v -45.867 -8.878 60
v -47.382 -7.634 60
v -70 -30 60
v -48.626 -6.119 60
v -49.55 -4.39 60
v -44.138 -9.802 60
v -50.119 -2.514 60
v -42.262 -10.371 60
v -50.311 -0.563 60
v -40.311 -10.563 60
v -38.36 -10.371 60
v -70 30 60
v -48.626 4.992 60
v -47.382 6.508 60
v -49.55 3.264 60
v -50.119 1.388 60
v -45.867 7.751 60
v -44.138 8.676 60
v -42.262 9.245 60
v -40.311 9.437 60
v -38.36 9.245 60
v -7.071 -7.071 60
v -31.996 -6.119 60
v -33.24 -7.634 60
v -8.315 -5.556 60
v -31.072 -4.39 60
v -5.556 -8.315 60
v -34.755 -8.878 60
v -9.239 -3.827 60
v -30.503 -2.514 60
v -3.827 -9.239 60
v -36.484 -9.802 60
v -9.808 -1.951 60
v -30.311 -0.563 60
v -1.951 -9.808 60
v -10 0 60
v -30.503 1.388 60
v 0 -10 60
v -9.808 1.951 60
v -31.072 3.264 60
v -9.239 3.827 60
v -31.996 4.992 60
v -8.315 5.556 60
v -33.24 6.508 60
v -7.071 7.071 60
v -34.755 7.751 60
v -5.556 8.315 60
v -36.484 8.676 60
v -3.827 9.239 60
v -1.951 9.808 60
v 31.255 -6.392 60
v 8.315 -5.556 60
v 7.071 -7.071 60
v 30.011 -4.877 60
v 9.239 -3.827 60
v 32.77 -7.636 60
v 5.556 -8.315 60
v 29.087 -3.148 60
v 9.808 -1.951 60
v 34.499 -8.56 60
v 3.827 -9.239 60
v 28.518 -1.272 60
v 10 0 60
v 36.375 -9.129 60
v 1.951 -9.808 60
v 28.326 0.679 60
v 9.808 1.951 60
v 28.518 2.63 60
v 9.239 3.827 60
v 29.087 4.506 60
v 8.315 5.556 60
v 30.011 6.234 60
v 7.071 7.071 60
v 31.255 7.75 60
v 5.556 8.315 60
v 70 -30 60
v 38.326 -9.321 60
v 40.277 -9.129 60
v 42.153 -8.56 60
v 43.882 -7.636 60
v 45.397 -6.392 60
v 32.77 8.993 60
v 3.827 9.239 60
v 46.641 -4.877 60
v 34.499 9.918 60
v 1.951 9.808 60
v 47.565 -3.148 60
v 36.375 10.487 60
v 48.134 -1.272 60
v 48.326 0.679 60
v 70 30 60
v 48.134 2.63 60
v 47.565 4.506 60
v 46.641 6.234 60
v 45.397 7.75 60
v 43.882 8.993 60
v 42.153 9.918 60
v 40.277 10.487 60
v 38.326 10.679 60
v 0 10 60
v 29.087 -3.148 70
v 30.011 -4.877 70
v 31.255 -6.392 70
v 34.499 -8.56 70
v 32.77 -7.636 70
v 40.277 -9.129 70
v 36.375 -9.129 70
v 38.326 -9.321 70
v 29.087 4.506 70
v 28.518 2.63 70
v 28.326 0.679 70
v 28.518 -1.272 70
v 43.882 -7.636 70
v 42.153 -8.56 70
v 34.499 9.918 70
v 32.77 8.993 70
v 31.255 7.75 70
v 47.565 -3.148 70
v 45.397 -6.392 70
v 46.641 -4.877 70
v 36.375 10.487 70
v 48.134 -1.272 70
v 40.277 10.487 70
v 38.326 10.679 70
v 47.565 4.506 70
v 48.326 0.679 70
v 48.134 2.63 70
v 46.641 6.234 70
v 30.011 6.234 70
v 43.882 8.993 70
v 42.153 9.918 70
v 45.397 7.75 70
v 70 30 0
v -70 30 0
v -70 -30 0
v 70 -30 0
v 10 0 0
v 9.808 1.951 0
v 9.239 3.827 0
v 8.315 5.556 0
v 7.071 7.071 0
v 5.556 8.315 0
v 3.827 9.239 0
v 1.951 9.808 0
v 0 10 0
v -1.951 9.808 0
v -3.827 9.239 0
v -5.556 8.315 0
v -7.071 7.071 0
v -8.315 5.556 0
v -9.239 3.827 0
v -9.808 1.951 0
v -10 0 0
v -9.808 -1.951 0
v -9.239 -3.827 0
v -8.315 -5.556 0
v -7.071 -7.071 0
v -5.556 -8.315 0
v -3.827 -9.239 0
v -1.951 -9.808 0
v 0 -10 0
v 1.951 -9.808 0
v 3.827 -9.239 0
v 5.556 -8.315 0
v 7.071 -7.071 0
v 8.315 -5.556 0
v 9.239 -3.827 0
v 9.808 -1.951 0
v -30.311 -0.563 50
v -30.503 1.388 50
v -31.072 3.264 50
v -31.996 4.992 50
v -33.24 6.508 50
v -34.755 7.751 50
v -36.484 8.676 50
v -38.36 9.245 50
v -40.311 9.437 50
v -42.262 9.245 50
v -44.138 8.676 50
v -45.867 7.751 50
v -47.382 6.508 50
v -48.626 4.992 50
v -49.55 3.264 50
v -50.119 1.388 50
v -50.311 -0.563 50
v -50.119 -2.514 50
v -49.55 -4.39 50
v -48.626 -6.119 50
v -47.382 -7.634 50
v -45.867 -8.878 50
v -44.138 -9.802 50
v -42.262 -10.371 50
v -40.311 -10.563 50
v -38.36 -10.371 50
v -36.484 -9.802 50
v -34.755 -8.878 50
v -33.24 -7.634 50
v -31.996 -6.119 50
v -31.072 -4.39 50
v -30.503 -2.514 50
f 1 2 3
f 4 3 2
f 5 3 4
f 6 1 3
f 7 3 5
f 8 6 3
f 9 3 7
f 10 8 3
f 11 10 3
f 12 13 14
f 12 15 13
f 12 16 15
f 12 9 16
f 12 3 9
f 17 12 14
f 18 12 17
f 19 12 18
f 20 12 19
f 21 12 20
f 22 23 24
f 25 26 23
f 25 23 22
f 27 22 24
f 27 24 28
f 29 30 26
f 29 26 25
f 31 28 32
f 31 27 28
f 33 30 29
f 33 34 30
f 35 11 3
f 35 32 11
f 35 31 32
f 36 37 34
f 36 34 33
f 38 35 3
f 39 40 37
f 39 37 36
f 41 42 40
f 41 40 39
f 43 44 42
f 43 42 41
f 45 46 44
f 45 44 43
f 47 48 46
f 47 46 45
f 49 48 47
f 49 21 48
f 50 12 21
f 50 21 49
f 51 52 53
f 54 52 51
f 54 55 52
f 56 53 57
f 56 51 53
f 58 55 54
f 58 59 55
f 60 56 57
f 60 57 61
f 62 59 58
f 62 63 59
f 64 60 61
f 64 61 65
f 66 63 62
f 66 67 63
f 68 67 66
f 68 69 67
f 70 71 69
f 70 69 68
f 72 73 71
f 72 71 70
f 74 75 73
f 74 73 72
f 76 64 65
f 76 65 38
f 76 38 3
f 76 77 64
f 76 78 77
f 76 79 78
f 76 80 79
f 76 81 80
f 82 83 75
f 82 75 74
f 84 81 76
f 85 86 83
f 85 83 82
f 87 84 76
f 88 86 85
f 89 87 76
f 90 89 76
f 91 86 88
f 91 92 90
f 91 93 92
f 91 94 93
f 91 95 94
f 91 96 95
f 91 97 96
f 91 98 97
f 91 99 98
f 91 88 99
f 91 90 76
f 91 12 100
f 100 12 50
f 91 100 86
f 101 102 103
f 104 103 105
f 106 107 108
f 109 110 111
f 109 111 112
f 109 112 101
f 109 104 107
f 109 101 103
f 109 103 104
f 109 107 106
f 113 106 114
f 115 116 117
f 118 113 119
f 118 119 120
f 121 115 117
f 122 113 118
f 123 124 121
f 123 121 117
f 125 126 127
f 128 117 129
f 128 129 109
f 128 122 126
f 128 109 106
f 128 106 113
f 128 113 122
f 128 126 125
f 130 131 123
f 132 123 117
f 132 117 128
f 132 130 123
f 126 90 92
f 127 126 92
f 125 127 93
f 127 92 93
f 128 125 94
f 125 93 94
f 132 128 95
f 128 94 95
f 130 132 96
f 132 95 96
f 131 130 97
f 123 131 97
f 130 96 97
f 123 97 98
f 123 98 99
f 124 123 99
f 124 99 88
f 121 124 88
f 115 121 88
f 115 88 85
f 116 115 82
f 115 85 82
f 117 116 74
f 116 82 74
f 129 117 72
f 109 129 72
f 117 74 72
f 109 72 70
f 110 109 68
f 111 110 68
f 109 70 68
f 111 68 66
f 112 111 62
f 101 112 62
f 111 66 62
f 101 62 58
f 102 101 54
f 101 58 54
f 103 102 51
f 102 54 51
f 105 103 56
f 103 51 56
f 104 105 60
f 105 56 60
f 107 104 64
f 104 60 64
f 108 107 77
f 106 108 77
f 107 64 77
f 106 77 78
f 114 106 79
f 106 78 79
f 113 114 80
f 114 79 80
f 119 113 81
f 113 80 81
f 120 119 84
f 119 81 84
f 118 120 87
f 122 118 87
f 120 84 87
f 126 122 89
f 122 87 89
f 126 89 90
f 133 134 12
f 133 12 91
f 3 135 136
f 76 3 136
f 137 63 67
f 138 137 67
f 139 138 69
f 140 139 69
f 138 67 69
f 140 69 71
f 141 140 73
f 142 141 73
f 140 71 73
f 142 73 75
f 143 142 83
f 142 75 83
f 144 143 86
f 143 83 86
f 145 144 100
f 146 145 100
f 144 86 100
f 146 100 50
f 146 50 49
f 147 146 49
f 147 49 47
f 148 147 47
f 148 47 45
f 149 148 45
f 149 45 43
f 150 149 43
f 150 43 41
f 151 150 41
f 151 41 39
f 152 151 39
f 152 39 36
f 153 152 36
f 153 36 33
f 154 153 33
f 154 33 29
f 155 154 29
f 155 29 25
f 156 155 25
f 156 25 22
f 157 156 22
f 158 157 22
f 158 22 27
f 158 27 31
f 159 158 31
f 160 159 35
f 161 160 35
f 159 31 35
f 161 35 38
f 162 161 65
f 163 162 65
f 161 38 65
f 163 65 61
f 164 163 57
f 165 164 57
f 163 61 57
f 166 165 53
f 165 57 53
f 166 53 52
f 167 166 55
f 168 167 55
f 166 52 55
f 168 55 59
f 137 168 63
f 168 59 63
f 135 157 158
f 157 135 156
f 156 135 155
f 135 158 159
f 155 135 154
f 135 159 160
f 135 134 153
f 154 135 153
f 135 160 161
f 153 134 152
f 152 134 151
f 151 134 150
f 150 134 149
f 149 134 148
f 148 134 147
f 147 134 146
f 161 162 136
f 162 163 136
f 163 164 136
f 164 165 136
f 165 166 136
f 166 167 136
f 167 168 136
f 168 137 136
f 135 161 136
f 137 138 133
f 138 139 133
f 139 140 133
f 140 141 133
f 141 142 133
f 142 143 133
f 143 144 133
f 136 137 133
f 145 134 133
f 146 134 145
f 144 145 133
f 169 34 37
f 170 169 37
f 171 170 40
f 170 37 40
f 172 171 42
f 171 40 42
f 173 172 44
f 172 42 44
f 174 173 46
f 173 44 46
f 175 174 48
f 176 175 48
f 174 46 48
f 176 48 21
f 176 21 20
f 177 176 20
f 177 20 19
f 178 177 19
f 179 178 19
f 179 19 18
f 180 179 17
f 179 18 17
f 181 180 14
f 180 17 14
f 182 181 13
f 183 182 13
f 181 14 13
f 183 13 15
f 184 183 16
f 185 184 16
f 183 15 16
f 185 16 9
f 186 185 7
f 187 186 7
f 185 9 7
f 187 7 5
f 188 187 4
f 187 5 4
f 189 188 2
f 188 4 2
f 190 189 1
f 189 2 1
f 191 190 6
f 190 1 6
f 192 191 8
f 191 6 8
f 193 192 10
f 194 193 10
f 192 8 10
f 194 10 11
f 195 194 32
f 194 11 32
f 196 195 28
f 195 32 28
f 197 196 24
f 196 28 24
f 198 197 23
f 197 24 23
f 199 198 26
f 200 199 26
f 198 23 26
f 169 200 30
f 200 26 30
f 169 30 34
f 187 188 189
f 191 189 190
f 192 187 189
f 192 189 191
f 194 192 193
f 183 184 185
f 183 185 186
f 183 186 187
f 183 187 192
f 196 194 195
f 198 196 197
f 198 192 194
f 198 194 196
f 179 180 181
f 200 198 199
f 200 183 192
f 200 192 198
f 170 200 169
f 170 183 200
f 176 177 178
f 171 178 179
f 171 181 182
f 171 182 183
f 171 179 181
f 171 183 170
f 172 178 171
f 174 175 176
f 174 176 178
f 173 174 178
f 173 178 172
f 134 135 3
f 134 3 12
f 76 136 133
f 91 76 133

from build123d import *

# Parameters (mm, degrees)
F0_W     = 140
F0_H     = 60
F1_DEPTH = 60
F5_R     = 10
F6_DEPTH = 10
F4_R     = 10
F7_DEPTH = 105.8
F3_R     = 10
F8_DEPTH = 10


with BuildPart() as f1:
    # F0 (on Top) → F1 (new body)
    with BuildSketch(Plane.XY):
        Rectangle(F0_W, F0_H)
    extrude(amount=F1_DEPTH)

    # F5 (on face) → F6 (join)
    with BuildSketch(Plane.XY.offset(60)):
        with Locations((38.326033, 0.678791)):
            Circle(F5_R)
    extrude(amount=F6_DEPTH)

    # F4 (on face) → F7 (cut)
    with BuildSketch(Plane.XY.offset(60)):
        Circle(F4_R)
    extrude(amount=-F7_DEPTH, mode=Mode.SUBTRACT)

    # F3 (on face) → F8 (cut)
    with BuildSketch(Plane.XY.offset(60)):
        with Locations((-40.310896, -0.563292)):
            Circle(F3_R)
    extrude(amount=-F8_DEPTH, mode=Mode.SUBTRACT)


solid = f1.part
